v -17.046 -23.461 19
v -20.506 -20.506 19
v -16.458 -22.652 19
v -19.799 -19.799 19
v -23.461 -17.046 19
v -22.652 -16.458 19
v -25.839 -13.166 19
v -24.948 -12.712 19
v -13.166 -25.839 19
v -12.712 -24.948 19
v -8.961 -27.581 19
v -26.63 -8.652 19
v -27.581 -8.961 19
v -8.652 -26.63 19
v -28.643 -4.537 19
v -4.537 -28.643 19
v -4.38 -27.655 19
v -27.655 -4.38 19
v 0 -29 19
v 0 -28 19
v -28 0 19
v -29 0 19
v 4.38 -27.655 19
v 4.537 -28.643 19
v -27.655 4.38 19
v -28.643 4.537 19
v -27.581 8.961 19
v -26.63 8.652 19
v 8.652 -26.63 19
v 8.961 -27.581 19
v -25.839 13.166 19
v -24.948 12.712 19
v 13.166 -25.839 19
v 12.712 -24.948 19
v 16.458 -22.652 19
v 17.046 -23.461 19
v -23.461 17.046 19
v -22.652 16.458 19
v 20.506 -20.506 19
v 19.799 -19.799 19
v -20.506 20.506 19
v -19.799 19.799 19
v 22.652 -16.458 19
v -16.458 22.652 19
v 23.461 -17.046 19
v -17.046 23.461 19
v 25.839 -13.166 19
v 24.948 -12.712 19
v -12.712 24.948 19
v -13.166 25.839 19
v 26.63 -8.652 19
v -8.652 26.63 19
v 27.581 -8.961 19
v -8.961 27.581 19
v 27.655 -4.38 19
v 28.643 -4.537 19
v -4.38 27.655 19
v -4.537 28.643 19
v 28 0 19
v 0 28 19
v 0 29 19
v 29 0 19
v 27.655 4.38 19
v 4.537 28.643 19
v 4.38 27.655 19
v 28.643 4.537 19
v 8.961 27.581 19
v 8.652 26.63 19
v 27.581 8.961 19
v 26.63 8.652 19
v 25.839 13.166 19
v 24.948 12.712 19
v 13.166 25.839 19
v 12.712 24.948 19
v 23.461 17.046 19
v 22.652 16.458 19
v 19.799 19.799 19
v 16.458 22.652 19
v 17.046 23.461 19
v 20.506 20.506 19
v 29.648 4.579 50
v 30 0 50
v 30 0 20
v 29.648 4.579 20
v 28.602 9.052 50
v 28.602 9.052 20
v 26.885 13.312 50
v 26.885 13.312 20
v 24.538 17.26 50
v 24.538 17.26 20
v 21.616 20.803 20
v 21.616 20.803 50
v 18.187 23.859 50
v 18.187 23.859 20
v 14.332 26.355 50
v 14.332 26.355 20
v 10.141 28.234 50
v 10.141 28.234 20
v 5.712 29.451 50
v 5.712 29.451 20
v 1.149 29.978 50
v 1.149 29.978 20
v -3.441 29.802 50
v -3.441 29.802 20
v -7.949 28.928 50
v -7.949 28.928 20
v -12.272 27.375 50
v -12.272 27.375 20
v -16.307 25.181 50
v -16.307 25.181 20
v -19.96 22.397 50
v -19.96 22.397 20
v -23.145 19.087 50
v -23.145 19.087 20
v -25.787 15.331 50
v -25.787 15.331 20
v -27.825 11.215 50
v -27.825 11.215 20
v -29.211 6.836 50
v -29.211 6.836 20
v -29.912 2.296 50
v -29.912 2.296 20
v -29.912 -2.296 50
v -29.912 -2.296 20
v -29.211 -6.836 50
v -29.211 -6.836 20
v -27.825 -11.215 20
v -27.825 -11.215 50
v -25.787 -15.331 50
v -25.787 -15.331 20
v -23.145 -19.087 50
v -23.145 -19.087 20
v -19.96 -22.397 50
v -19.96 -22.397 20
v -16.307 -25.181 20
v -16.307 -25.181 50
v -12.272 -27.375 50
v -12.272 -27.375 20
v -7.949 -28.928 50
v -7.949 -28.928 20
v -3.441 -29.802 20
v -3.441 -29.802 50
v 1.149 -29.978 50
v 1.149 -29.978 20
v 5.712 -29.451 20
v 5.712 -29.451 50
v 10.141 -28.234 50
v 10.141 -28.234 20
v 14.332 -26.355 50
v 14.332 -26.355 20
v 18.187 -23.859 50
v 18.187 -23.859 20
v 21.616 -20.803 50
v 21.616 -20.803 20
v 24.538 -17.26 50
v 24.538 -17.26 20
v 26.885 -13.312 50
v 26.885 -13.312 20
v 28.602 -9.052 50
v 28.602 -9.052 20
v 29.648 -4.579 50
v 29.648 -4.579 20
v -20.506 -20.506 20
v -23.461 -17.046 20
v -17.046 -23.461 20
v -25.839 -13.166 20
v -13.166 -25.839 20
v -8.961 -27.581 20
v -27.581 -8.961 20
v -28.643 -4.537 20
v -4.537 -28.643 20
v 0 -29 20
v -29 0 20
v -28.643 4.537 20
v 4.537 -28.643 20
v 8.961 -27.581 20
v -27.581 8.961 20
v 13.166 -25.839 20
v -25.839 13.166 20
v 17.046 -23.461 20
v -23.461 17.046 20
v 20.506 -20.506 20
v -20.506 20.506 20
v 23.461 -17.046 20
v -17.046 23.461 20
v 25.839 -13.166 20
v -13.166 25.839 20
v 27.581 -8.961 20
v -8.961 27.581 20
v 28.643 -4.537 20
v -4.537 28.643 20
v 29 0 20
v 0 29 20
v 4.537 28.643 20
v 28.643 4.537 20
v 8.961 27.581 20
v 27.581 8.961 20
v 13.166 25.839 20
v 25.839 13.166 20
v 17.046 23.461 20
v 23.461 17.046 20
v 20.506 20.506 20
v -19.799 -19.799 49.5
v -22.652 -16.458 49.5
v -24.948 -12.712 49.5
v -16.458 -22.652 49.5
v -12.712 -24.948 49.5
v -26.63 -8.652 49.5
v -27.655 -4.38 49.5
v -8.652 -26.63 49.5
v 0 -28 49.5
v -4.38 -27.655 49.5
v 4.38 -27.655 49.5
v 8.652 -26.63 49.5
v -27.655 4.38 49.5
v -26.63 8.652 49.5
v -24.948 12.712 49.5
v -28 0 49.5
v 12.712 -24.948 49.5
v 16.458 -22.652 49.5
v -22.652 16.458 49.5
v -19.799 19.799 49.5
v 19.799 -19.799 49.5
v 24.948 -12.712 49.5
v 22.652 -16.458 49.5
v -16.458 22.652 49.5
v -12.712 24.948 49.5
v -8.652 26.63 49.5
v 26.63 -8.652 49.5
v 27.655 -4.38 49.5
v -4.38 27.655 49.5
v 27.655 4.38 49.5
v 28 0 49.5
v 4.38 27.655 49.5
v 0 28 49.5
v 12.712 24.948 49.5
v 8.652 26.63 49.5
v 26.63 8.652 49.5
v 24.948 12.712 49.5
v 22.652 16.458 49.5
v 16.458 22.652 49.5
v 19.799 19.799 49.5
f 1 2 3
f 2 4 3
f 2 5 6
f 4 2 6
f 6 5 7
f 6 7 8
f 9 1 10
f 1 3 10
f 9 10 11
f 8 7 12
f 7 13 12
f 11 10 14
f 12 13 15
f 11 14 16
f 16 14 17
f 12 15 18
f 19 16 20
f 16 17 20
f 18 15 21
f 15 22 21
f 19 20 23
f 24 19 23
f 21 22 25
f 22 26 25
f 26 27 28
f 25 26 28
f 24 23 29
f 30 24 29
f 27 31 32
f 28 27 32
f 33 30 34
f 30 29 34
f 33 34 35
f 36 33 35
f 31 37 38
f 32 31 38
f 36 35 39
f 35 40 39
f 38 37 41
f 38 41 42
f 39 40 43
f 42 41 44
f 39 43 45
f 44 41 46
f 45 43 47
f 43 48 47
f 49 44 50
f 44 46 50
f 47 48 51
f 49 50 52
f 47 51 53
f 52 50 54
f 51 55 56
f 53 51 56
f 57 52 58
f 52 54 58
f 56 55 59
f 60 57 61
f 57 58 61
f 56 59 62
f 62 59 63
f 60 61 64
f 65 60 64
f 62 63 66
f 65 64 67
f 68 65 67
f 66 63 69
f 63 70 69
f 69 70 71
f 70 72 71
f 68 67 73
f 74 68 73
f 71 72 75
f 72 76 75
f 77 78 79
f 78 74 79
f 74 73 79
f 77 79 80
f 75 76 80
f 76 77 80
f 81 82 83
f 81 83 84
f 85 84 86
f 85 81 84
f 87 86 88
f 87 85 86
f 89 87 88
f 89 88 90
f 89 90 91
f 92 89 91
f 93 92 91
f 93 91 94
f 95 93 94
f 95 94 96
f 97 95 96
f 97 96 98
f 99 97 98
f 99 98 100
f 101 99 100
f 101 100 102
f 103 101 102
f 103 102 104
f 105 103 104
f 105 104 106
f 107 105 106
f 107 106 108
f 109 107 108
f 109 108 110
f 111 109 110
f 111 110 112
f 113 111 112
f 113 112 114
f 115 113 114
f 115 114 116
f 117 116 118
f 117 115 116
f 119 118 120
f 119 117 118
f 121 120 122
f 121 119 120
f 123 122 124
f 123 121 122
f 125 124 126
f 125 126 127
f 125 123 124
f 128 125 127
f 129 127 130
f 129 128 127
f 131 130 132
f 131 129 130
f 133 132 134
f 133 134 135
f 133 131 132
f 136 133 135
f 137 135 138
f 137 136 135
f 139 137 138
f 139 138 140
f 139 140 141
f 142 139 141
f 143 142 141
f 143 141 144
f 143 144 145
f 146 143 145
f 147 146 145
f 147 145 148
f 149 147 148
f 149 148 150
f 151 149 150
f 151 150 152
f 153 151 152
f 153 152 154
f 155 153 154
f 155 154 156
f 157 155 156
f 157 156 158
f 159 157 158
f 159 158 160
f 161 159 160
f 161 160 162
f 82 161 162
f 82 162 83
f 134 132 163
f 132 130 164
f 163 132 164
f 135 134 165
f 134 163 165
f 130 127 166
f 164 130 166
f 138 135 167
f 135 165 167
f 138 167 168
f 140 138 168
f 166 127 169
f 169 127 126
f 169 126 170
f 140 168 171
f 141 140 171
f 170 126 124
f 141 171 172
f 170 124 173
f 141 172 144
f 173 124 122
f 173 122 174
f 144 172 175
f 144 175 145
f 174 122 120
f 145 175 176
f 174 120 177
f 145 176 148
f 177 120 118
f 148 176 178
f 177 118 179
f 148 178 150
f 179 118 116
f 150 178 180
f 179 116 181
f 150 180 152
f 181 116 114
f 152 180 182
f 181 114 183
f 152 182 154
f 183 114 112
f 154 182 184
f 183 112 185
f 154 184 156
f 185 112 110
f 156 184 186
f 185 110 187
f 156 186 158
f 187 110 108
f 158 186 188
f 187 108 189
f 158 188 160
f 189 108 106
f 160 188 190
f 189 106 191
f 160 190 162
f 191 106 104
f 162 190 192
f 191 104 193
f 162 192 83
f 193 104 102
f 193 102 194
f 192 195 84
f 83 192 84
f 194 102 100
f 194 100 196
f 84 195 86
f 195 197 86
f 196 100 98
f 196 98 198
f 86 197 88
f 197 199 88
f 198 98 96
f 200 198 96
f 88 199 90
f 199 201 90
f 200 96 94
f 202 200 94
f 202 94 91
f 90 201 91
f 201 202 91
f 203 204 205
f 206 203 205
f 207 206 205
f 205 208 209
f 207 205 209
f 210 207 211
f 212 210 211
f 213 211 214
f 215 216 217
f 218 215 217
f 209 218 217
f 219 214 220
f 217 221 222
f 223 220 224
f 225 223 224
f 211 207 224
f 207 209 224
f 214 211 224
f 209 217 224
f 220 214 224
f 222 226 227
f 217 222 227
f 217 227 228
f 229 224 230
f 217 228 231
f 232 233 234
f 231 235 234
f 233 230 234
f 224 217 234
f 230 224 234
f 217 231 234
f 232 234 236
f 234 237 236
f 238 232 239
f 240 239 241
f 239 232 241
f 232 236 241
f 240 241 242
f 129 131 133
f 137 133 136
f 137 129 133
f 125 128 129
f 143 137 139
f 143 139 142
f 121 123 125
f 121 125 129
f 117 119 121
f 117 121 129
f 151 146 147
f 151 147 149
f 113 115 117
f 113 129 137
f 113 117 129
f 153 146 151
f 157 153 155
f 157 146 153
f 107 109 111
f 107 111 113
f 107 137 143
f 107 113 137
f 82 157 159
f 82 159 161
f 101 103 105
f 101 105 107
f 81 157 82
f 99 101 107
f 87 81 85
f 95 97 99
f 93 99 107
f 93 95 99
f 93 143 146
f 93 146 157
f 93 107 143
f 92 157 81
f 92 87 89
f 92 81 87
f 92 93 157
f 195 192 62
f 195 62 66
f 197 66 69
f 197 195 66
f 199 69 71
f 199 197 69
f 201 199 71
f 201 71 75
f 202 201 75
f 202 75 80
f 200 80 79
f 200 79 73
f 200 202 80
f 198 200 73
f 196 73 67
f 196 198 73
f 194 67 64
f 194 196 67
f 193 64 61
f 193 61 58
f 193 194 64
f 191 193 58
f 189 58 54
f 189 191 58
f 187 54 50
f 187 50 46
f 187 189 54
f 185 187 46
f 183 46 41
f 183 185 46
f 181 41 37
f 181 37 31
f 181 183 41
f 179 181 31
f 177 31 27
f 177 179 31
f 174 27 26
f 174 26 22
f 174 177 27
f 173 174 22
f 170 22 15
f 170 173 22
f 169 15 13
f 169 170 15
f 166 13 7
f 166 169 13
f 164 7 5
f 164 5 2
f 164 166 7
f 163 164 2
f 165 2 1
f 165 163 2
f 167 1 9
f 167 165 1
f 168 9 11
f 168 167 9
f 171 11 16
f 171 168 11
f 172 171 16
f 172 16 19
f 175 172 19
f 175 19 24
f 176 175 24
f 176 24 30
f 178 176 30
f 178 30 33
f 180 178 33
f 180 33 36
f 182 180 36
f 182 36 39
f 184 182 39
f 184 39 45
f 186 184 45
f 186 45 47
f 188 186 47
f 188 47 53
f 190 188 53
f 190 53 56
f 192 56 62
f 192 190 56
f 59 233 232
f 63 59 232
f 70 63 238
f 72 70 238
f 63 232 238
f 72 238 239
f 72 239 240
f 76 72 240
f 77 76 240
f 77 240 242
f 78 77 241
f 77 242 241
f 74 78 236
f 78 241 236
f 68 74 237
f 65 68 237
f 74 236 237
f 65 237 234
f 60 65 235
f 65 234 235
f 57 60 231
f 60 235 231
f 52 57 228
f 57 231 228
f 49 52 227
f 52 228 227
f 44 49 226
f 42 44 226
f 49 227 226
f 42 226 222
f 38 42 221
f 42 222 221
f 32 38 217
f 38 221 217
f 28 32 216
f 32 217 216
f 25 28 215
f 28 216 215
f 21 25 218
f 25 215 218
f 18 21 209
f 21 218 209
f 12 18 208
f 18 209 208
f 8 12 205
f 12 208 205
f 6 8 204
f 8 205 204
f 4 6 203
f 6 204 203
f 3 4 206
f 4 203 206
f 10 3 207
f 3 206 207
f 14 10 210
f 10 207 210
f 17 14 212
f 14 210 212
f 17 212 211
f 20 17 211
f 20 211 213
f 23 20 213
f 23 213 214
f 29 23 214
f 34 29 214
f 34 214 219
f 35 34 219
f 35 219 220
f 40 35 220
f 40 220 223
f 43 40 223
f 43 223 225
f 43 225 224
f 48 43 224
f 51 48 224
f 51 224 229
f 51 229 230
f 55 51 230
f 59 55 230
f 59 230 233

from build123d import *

# Parameters (mm, degrees)
SKETCH_R        = 30
PAD_DEPTH       = 20
SKETCH001_R     = 29
POCKET_DEPTH    = 1
SKETCH002_R     = 28
POCKET001_DEPTH = 19
SKETCH003_R     = 30
PAD001_DEPTH    = 31
SKETCH004_R     = 28
POCKET002_DEPTH = 29.5


with BuildPart() as body:
    # Sketch → Pad (new body)
    with BuildSketch(Plane.XY):
        Circle(SKETCH_R)
    extrude(amount=PAD_DEPTH)

    # Sketch001 → Pocket (cut)
    with BuildSketch(Plane.XY.offset(20)):
        Circle(SKETCH001_R)
    extrude(amount=-POCKET_DEPTH, mode=Mode.SUBTRACT)

    # Sketch002 (on Face3 of Pocket) → Pocket001 (cut)
    with BuildSketch(Plane.XY.offset(20)):
        Circle(SKETCH002_R)
    extrude(amount=-POCKET001_DEPTH, mode=Mode.SUBTRACT)


with BuildPart() as cut:
    # Sketch003 → Pad001 (new body)
    with BuildSketch(Plane.XY.offset(50)):
        Circle(SKETCH003_R)
    extrude(amount=-PAD001_DEPTH)

    # Sketch004 (on Face2 of Pad001) → Pocket002 (cut, symmetric)
    with BuildSketch(Plane.XY.offset(20)):
        Circle(SKETCH004_R)
    extrude(amount=POCKET002_DEPTH, both=True, mode=Mode.SUBTRACT)

    # Cut: cut Body
    add(body.part, mode=Mode.SUBTRACT)


solid = cut.part
